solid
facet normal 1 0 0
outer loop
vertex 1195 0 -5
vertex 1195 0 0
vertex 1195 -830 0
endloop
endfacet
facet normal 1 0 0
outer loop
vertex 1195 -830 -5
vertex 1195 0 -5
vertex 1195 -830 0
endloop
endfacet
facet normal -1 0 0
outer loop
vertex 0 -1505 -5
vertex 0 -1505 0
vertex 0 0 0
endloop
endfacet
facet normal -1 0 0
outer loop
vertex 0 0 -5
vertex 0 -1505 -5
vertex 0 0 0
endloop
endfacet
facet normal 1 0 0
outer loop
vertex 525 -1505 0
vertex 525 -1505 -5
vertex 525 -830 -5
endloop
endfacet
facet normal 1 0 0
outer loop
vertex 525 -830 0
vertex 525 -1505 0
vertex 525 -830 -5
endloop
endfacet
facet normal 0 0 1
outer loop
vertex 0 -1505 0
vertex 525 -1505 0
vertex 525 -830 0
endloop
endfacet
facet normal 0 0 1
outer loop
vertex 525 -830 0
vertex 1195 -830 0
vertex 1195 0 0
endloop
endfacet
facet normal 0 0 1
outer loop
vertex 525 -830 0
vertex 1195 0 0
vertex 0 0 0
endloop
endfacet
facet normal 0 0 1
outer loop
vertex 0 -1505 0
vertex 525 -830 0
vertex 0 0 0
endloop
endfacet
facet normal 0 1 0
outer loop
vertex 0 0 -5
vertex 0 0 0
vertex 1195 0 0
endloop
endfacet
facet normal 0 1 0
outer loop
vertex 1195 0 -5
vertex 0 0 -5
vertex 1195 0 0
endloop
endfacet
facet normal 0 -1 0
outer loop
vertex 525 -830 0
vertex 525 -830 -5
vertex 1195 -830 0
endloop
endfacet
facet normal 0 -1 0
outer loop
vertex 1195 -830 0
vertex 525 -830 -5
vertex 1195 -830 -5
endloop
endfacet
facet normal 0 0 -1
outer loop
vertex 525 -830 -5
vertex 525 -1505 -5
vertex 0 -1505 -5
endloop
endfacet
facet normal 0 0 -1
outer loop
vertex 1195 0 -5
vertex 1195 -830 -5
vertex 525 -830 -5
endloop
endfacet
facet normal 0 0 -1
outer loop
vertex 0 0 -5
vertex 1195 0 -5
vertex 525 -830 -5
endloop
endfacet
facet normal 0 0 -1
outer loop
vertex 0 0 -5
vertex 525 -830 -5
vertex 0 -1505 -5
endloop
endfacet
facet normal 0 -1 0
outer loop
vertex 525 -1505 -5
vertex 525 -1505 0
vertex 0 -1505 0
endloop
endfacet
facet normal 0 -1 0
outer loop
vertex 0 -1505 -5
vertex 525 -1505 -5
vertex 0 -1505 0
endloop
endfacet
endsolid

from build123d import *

# Parameters (mm, degrees)
TABAN_FLAN_1_DEPTH         = 5
KES_EKSTR_ZYON1_DEPTH      = 2347.284296499
KES_EKSTR_ZYON1_DEPTH_BACK = 2347.284296499


# Sheet-metal steps are written as plain solids
with BuildPart() as part:
    # Çizim1 → Taban-Flanş1 (new body)
    with BuildSketch(Plane.XY):
        Polygon((0, 0), (1195, 0), (1195, -895), (1800, -895), (1800, -1505), (0, -1505), align=None)
    extrude(amount=-TABAN_FLAN_1_DEPTH)

    # Çizim2 → Kes-Ekstrüzyon1 (cut, two sides: drawn at the far end of the back side and taken through both)
    with BuildSketch(Plane.XY.offset(-KES_EKSTR_ZYON1_DEPTH_BACK)):
        Polygon((525, -1505), (525, -830), (1195, -830), (1965.528313332, -849.744695172), (1943.261334952, -1718.704035599), align=None)
    extrude(amount=KES_EKSTR_ZYON1_DEPTH + KES_EKSTR_ZYON1_DEPTH_BACK, mode=Mode.SUBTRACT)


solid = part.part
